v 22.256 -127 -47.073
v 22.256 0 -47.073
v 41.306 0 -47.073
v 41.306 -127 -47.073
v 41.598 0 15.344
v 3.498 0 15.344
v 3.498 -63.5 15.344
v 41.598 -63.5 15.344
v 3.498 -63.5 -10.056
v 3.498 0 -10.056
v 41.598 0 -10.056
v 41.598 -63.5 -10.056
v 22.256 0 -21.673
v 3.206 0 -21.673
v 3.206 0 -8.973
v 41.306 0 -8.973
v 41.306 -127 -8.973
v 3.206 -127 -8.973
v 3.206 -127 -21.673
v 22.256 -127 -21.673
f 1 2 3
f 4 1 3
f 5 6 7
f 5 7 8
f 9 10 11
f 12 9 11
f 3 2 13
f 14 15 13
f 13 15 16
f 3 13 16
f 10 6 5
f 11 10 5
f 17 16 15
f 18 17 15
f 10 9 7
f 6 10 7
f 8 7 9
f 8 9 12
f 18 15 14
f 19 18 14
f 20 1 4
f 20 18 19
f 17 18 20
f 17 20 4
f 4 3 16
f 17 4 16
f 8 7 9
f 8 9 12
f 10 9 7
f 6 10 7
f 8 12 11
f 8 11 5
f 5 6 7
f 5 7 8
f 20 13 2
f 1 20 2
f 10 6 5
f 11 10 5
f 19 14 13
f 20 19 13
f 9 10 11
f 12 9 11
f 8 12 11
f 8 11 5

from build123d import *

# Parameters (mm, degrees)
F1_DEPTH = 127
F2_W     = 38.1
F2_H     = 25.4
F3_DEPTH = 63.5
F4_DEPTH = 63.5


with BuildPart() as f1:
    # F0 (on Front) → F1 (new body)
    with BuildSketch(Plane.XZ):
        Polygon((22.256231, -21.673279), (22.256231, -47.073279), (41.306231, -47.073279), (41.306231, -8.973279), (3.206231, -8.973279), (3.206231, -21.673279), align=None)
    extrude(amount=F1_DEPTH)


with BuildPart() as f3:
    # F2 (on Front) → F3 (new body)
    with BuildSketch(Plane.XZ):
        with Locations((22.547705, 2.644099)):
            Rectangle(F2_W, F2_H)
    extrude(amount=F3_DEPTH)


with BuildPart() as f4:
    # F2 (on Front) → F4 (new body)
    with BuildSketch(Plane.XZ):
        with Locations((22.547705, 2.644099)):
            Rectangle(F2_W, F2_H)
    extrude(amount=F4_DEPTH)


solid = Compound([f1.part, f3.part, f4.part])
